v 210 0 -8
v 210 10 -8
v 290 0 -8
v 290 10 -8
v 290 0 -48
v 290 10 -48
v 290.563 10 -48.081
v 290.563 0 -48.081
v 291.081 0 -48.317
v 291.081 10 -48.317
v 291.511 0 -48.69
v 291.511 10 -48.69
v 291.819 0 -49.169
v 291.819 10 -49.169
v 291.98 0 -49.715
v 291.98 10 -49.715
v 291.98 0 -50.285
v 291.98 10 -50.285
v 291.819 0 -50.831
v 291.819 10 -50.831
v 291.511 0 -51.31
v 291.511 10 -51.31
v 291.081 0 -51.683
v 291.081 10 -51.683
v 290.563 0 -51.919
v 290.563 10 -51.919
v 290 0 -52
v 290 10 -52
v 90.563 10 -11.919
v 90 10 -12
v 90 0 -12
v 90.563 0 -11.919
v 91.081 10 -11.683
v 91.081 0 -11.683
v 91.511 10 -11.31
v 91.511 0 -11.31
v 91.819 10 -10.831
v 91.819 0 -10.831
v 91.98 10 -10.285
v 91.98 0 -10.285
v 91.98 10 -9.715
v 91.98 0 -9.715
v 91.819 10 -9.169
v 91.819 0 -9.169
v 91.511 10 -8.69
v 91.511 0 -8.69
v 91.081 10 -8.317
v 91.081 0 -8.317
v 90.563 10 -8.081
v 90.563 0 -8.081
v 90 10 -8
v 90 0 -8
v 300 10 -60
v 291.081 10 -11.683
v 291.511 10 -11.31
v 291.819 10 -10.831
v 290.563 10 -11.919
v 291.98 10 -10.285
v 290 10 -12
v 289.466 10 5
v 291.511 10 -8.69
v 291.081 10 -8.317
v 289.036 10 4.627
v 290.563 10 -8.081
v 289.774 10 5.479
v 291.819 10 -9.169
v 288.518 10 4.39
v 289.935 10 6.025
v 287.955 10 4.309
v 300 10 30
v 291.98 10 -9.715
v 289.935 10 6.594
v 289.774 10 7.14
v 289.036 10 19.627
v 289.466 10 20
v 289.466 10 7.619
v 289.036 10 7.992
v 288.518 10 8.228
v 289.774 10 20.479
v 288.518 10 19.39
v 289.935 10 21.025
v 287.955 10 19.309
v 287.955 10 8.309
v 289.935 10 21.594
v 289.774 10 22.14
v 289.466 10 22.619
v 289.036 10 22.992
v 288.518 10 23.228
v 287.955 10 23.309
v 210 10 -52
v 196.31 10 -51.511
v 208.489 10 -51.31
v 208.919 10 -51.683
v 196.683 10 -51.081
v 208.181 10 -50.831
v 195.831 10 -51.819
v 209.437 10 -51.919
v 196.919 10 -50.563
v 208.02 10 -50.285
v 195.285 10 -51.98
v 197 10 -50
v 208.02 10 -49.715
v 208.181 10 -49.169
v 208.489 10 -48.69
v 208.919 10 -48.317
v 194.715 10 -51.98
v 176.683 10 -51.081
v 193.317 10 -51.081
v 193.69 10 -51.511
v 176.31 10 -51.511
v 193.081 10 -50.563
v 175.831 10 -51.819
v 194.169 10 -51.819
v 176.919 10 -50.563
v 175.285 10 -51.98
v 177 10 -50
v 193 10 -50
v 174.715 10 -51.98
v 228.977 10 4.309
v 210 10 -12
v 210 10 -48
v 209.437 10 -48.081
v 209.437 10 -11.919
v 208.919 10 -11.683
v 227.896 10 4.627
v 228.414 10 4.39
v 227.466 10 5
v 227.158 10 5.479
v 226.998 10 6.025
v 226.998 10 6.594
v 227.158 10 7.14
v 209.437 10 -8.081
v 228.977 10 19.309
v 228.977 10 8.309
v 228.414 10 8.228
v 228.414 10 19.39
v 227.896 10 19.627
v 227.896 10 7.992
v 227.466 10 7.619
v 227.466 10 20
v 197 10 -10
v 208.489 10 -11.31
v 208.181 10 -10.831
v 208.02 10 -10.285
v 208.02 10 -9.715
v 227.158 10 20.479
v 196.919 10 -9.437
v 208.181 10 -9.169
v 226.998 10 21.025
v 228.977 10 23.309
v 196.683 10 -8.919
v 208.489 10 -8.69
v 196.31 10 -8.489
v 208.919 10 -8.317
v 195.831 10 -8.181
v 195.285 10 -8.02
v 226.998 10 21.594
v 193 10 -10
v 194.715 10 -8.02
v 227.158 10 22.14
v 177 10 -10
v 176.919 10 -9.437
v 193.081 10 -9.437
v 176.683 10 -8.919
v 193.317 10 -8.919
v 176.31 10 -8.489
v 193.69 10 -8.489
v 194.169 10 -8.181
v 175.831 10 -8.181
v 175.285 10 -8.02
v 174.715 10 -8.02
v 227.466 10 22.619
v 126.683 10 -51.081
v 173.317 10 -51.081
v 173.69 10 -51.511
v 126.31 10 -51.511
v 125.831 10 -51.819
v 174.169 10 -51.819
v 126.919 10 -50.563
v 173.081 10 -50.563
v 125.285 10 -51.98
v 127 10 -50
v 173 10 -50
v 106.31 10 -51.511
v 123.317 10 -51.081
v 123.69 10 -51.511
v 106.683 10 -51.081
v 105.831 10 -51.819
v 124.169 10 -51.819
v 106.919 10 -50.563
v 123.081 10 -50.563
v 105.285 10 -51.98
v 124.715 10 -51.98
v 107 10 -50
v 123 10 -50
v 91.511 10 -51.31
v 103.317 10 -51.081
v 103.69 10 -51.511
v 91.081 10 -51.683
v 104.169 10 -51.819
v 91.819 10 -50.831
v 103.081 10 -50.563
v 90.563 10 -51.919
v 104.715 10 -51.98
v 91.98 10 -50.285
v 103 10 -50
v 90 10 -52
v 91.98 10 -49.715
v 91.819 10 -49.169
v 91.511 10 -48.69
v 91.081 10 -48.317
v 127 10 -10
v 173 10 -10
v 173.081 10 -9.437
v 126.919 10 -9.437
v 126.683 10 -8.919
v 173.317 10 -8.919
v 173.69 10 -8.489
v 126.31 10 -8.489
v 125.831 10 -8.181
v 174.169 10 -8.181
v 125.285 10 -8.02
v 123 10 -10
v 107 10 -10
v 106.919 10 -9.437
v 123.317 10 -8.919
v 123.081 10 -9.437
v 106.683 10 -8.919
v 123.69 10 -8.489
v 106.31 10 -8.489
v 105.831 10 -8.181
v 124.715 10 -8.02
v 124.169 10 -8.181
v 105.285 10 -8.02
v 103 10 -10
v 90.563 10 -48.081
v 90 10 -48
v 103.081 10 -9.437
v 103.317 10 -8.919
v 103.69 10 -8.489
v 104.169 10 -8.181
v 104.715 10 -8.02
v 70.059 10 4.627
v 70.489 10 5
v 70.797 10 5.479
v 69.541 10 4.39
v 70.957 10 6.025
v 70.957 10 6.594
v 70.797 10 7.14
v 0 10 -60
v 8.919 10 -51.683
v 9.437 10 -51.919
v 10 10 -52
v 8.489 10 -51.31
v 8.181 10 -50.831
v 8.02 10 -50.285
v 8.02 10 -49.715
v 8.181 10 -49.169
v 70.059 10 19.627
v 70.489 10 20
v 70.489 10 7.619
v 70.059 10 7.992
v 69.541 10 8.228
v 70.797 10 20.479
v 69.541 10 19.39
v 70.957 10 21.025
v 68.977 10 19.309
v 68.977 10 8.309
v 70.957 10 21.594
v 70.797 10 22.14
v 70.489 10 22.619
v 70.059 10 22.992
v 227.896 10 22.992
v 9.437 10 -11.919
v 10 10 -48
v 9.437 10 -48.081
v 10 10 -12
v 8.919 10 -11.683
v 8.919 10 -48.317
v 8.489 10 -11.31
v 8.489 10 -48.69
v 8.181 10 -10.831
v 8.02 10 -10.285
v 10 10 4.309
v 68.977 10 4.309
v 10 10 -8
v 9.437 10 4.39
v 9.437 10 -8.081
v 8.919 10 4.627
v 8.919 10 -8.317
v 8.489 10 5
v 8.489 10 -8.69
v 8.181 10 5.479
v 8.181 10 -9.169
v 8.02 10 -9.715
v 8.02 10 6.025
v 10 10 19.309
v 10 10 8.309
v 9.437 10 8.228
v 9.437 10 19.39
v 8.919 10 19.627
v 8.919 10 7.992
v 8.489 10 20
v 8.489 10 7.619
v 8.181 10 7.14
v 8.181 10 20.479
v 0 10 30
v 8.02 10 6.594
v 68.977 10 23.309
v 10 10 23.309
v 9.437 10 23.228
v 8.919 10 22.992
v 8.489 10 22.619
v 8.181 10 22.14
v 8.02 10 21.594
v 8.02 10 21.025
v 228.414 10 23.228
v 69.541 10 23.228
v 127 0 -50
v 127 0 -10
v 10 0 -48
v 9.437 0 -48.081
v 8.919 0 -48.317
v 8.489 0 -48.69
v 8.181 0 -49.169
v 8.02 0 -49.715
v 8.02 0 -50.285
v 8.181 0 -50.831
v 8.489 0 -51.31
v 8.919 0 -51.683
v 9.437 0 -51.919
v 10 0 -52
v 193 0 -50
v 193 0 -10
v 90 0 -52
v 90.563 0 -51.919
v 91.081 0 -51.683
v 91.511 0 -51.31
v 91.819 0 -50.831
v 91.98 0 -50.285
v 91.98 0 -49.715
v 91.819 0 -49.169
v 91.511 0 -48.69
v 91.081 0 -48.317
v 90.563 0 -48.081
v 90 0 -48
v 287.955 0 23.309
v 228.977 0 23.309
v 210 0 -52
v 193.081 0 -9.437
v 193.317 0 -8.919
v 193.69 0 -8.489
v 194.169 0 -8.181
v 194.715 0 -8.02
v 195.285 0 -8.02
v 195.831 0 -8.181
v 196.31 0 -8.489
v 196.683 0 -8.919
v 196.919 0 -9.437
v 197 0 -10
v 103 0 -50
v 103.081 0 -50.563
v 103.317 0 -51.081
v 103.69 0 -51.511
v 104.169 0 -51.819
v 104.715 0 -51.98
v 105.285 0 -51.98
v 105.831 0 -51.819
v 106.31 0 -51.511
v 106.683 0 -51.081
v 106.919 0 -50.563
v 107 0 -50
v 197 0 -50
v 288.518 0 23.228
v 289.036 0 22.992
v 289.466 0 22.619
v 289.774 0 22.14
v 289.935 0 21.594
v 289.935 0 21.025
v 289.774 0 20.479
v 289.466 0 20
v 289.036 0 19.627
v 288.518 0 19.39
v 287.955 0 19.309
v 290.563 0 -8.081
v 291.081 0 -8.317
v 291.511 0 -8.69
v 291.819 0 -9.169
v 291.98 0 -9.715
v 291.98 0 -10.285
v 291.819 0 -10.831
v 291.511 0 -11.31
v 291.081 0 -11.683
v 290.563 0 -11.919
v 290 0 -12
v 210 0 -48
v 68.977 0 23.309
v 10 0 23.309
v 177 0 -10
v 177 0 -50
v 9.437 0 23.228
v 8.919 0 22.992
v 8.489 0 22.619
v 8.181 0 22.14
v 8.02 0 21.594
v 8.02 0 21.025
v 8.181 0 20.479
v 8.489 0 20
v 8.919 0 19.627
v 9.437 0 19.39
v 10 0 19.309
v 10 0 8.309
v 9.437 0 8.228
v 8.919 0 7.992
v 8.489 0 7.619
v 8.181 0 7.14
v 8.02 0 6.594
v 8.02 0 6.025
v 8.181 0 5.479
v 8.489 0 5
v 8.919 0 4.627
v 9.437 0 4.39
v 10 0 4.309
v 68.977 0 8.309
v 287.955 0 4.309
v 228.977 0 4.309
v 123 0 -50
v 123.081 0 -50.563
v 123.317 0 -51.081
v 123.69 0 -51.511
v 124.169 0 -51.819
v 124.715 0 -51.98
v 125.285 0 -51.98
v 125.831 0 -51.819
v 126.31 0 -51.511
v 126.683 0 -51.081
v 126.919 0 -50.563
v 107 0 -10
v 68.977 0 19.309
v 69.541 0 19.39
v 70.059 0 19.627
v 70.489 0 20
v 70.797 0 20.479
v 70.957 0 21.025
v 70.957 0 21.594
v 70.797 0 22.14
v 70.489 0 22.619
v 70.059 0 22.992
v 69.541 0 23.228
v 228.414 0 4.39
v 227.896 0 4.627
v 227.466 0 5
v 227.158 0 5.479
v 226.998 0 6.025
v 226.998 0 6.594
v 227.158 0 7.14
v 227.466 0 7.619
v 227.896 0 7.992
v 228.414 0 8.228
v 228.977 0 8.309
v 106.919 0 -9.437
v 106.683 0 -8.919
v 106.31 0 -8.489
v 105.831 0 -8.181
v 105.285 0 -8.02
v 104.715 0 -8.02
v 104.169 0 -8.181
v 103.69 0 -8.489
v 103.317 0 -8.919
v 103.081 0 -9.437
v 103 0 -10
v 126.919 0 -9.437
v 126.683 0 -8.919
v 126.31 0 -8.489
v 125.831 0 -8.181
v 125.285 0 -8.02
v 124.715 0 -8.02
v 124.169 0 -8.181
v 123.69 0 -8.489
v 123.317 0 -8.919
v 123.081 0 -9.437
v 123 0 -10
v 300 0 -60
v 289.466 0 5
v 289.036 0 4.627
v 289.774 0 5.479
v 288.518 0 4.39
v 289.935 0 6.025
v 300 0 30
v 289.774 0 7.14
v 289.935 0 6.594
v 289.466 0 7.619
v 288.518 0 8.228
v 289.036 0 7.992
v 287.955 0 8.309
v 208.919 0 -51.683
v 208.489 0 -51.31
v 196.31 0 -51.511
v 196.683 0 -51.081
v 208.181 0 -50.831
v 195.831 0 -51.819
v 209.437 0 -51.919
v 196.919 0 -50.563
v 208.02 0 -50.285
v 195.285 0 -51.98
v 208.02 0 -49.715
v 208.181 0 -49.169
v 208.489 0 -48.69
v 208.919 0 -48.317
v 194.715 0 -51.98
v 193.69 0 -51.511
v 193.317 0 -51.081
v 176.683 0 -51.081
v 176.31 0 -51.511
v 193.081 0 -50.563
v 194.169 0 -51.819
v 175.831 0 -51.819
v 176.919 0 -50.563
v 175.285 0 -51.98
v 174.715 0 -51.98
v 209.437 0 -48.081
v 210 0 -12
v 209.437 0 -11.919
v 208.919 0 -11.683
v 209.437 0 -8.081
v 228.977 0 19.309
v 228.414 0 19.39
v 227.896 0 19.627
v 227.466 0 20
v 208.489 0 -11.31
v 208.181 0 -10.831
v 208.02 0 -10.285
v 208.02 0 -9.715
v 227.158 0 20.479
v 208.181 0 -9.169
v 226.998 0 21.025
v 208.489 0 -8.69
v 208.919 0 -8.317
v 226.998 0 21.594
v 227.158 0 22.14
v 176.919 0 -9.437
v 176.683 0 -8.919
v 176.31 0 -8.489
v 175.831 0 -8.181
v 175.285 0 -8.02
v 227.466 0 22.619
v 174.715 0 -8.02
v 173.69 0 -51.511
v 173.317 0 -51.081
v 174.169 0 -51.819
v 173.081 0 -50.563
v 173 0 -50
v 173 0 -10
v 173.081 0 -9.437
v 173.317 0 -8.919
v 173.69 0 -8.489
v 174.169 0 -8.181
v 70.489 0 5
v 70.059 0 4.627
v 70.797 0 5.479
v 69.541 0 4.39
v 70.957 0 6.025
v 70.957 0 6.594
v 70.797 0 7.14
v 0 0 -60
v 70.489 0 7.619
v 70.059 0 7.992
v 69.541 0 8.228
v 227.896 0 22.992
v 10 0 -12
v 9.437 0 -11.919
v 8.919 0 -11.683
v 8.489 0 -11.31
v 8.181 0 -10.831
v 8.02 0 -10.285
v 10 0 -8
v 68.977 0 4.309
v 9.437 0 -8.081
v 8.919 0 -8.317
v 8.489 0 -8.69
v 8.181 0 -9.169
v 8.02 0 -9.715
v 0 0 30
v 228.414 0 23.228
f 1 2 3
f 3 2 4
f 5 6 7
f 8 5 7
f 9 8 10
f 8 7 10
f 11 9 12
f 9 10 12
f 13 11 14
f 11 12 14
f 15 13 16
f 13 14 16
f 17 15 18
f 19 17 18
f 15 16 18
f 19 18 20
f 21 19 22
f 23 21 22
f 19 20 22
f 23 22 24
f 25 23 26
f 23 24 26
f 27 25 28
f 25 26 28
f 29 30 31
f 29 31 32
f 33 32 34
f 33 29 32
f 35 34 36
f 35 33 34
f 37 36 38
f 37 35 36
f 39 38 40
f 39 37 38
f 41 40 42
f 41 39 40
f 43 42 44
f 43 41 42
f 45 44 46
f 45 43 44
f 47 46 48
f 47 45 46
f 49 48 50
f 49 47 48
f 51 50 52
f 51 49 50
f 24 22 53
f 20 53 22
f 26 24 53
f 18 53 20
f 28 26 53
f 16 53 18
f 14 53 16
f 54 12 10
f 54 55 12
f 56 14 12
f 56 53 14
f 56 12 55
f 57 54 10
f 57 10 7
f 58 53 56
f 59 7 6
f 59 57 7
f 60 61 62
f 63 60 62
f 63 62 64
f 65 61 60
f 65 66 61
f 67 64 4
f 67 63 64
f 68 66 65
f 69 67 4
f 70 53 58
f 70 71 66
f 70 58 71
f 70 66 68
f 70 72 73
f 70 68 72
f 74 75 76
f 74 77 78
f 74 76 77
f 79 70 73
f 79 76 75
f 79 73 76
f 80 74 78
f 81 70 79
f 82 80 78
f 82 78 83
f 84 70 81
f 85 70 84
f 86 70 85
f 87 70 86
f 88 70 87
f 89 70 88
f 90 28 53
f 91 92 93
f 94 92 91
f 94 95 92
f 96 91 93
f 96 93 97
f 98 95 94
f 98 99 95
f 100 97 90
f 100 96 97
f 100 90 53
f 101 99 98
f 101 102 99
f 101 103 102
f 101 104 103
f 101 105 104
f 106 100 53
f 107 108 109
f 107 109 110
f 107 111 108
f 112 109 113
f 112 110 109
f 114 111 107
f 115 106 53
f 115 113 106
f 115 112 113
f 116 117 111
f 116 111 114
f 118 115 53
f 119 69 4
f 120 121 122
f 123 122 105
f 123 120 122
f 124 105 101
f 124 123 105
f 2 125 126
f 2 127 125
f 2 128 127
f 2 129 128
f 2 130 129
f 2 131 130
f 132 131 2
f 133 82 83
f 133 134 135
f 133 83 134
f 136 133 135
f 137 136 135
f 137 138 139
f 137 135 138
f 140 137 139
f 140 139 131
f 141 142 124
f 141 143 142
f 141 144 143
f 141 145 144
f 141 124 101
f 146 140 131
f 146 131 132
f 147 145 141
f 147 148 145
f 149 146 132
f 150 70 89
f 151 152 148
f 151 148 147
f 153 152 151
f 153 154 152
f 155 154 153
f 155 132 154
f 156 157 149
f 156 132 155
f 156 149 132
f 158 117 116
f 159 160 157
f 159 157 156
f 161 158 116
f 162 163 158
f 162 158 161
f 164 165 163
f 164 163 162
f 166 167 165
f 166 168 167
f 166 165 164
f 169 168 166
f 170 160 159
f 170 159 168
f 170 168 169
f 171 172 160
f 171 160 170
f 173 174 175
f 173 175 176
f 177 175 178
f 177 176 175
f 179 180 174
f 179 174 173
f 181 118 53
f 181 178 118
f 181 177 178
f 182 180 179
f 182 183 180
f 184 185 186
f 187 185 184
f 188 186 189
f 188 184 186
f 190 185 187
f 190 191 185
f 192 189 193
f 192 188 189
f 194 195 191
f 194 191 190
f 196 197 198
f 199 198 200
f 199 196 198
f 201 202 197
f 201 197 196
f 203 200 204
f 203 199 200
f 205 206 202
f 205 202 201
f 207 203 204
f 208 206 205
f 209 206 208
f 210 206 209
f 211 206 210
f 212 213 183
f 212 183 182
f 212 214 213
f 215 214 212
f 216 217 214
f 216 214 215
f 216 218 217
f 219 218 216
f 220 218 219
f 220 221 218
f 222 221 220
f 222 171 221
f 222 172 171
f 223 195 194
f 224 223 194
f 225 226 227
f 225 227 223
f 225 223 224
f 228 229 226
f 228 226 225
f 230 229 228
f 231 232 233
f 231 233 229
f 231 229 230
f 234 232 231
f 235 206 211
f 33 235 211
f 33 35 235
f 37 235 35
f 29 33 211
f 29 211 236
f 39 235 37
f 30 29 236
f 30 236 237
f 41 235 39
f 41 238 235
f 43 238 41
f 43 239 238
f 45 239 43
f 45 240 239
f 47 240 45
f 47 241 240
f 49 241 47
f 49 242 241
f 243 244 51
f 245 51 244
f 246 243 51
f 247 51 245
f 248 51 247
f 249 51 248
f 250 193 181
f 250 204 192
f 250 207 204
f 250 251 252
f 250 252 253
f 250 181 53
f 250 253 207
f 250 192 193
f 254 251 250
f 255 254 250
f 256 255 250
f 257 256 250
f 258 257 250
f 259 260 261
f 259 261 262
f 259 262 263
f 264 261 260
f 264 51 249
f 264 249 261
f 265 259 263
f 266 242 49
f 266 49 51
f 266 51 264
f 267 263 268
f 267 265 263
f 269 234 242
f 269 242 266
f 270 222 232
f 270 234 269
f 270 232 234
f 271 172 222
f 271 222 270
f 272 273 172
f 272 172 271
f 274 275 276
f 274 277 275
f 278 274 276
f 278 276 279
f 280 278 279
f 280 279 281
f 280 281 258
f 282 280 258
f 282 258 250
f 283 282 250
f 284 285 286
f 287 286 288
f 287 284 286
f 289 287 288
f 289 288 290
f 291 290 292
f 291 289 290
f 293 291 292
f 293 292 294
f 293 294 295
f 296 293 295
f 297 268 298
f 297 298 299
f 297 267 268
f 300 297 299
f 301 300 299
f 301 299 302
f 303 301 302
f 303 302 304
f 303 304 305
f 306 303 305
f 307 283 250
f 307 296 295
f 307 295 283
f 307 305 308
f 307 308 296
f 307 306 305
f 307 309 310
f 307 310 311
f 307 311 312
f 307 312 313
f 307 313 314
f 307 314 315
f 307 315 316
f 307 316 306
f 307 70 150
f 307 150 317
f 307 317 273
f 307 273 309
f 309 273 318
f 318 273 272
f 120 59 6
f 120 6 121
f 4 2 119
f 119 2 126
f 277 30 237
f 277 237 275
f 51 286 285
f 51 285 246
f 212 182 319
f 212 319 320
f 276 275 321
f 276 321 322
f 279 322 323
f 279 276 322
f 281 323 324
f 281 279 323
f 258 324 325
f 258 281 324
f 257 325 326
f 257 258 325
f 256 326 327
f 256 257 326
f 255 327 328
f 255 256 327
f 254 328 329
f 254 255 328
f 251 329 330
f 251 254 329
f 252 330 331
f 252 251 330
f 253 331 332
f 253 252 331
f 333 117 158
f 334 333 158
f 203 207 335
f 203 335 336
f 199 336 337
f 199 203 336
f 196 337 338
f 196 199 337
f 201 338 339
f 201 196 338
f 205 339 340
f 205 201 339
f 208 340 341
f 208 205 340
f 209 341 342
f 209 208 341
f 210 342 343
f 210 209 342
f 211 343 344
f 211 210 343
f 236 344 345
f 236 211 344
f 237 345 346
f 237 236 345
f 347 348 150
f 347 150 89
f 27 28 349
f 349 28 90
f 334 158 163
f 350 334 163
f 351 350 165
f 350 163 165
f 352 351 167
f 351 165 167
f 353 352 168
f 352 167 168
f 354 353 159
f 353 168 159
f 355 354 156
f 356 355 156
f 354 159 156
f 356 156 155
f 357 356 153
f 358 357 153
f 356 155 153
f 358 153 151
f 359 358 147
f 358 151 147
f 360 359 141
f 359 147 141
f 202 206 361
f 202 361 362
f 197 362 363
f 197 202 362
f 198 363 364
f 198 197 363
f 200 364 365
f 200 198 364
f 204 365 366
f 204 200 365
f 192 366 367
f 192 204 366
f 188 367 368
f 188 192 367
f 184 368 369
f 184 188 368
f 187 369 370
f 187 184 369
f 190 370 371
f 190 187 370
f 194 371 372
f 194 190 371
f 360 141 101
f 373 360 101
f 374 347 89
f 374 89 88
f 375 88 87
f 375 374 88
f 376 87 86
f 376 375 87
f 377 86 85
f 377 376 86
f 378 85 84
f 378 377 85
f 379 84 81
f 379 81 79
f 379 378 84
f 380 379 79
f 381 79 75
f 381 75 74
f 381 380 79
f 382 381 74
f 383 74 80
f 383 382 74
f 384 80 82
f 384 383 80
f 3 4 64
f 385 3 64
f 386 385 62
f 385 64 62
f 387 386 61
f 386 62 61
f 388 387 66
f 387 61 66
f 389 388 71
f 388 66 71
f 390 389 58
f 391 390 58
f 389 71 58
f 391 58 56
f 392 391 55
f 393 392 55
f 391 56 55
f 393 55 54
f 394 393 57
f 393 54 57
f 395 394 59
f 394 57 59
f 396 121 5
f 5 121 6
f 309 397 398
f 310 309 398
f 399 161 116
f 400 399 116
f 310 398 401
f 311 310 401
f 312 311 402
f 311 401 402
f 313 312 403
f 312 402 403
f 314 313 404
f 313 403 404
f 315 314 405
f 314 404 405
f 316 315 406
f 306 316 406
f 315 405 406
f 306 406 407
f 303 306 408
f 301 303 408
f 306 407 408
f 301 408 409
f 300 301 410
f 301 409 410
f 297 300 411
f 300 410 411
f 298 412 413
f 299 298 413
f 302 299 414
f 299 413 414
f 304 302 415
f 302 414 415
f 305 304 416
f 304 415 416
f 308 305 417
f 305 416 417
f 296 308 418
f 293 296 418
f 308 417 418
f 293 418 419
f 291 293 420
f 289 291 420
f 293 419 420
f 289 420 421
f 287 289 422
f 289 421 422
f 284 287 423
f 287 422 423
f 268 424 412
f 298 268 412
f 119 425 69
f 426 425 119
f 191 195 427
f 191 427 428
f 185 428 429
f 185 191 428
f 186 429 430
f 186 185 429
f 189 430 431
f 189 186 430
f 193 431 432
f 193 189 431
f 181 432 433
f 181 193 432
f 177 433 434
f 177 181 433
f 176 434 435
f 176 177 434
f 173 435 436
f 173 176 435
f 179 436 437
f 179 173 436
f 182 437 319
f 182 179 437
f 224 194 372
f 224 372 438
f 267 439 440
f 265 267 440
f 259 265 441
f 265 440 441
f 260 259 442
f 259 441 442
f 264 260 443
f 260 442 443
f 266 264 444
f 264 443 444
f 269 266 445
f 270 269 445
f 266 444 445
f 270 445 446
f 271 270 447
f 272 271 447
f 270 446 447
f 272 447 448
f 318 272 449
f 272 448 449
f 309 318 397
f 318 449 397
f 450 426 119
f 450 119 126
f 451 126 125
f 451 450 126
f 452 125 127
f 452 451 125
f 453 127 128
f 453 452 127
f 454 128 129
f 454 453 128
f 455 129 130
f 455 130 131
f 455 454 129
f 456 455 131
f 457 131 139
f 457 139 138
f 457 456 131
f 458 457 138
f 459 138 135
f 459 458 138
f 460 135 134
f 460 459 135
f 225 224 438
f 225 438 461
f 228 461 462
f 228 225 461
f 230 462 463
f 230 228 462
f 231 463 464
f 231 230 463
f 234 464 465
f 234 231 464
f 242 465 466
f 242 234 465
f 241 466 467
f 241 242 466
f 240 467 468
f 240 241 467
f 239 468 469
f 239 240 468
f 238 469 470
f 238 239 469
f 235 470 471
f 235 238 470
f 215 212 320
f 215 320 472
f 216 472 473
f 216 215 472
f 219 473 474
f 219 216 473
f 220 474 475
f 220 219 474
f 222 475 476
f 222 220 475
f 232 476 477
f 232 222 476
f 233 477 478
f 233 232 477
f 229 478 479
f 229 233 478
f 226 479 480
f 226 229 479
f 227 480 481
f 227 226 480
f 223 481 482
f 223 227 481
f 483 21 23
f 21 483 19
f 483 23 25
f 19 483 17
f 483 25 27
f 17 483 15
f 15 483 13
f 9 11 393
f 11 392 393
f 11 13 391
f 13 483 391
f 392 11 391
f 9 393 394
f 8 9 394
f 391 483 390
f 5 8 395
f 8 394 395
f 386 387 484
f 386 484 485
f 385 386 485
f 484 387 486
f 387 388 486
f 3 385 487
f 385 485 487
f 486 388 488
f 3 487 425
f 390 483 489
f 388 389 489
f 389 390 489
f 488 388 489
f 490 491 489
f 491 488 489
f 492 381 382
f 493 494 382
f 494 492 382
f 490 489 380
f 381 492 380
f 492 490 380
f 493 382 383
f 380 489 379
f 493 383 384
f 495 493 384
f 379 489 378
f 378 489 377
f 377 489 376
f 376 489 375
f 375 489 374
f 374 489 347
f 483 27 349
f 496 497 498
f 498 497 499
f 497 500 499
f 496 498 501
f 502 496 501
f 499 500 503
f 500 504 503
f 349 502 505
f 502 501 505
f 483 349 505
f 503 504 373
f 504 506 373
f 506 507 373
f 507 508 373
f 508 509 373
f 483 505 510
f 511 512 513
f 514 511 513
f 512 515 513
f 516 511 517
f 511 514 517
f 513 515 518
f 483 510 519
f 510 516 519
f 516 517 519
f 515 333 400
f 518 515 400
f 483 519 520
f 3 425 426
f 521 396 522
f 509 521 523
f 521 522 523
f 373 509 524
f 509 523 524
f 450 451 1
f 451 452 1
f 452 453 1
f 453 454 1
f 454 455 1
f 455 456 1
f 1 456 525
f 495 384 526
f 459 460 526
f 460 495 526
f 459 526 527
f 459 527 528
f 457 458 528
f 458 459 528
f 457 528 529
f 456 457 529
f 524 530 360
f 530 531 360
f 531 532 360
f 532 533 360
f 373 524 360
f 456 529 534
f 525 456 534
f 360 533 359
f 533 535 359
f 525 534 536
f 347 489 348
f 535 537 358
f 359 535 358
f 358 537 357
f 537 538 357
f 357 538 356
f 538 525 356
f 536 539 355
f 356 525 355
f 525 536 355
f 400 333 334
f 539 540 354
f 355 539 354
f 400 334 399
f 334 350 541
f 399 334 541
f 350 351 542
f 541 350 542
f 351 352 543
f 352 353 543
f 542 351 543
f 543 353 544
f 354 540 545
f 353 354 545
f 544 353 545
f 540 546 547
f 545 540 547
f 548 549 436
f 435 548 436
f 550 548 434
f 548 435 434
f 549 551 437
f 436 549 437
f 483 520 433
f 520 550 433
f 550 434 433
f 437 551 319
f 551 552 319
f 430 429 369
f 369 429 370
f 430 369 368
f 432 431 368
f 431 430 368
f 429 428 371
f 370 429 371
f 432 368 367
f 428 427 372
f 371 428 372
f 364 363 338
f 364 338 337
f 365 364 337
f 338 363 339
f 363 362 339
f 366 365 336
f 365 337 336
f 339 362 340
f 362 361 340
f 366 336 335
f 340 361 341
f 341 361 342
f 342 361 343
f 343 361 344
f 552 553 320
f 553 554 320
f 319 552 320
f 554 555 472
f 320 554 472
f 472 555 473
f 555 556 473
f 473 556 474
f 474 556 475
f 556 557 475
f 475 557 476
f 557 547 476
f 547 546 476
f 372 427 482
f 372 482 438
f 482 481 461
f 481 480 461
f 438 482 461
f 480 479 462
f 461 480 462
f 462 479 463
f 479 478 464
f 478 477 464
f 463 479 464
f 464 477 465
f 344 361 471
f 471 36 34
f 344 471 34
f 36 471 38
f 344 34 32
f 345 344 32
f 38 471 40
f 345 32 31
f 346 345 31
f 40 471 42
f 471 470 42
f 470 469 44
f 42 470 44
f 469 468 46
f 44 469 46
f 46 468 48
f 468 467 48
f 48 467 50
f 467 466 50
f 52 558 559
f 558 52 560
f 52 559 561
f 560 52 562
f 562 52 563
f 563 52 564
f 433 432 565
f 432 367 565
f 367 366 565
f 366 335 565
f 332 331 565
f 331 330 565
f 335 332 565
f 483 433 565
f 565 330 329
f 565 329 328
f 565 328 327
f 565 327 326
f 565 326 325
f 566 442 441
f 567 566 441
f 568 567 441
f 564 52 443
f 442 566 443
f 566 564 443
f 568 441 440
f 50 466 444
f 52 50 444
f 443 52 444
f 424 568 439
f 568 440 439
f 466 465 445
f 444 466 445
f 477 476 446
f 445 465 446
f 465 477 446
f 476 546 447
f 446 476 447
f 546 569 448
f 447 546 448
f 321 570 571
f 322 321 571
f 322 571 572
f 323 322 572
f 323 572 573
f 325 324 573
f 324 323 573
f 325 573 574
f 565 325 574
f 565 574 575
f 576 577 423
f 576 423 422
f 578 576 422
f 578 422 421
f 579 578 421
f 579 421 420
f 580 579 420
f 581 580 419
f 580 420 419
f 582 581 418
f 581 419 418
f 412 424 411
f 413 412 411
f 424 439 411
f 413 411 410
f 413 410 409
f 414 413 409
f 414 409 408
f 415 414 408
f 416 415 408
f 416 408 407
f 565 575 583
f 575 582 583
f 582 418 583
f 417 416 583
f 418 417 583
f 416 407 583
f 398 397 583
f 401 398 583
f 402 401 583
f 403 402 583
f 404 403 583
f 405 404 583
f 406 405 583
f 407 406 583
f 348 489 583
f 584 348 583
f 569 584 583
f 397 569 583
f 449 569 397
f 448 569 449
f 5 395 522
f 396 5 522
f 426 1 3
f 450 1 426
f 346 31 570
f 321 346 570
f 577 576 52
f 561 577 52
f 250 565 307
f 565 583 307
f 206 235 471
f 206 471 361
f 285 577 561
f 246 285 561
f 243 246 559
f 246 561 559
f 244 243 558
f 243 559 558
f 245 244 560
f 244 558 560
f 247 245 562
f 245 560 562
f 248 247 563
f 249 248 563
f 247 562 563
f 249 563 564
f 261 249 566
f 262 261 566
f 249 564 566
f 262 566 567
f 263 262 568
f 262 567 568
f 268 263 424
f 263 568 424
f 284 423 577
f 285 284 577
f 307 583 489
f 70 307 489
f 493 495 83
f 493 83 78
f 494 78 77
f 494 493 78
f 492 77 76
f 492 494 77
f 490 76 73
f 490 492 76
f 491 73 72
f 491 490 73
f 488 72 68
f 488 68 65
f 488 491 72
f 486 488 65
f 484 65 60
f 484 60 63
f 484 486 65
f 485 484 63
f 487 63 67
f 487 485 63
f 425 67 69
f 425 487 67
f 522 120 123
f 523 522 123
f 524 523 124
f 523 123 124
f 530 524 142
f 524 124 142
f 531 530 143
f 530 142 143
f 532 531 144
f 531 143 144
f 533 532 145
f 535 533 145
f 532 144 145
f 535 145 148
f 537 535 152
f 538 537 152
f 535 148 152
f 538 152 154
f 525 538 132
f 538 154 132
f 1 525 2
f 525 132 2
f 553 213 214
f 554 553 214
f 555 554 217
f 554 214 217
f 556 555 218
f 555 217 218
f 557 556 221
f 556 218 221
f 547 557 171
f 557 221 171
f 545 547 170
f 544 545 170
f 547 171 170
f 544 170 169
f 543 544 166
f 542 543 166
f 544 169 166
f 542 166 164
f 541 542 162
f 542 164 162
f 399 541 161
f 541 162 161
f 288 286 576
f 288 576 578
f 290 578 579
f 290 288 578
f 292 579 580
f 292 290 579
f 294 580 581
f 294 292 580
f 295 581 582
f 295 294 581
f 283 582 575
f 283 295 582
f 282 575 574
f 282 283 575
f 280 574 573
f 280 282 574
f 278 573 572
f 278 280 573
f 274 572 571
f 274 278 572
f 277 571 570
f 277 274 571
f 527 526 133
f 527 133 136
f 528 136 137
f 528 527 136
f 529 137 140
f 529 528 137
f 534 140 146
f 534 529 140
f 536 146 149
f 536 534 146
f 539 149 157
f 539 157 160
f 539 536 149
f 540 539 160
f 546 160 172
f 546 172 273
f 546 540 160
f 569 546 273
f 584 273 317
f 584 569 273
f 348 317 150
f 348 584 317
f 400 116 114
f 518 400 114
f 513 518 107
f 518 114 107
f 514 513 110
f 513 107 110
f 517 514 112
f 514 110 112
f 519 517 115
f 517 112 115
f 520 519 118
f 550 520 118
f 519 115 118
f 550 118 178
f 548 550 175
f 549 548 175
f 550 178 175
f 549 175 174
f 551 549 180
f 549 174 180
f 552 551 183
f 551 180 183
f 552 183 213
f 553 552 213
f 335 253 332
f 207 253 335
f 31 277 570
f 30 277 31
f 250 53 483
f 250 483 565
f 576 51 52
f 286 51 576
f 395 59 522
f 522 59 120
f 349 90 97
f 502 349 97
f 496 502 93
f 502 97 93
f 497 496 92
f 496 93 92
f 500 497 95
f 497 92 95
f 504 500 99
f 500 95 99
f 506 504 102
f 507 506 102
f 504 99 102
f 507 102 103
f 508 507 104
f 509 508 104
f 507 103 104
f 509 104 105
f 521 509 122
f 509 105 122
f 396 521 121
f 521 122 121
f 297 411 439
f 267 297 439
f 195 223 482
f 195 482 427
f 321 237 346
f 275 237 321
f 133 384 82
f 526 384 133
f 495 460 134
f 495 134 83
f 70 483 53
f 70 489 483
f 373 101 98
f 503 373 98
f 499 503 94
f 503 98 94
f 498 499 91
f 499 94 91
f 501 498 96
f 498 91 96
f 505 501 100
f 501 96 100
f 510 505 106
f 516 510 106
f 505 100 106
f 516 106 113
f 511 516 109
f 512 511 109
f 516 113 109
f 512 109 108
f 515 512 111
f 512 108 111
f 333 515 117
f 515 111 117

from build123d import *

# Parameters (mm, degrees)
SKETCH1_W           = 300
SKETCH1_H           = 30
BOSS_EXTRUDE1_DEPTH = 10
SKETCH2_W           = 300
SKETCH2_H           = 10
BOSS_EXTRUDE2_DEPTH = 60
CUT_EXTRUDE1_DEPTH  = 307.1045573


with BuildPart() as part:
    # Sketch1 → Boss-Extrude1 (new body)
    with BuildSketch(Plane(origin=(0, 0, 0), x_dir=(1, 0, 0), z_dir=(0, 1, 0))):
        with Locations((150, -15)):
            Rectangle(SKETCH1_W, SKETCH1_H)
        with BuildLine():
            Line((68.977444605, -8.309450677), (10, -8.309450677))
            ThreePointArc((10, -8.309450677), (8, -6.309450677), (10, -4.309450677))
            Line((10, -4.309450677), (68.977444605, -4.309450677))
            ThreePointArc((68.977444605, -4.309450677), (70.977444605, -6.309450677), (68.977444605, -8.309450677))
        make_face(mode=Mode.SUBTRACT)
        with BuildLine():
            Line((68.977444605, -23.309450677), (10, -23.309450677))
            ThreePointArc((10, -23.309450677), (8, -21.309450677), (10, -19.309450677))
            Line((10, -19.309450677), (68.977444605, -19.309450677))
            ThreePointArc((68.977444605, -19.309450677), (70.977444605, -21.309450677), (68.977444605, -23.309450677))
        make_face(mode=Mode.SUBTRACT)
        with BuildLine():
            Line((228.977444605, -23.309450677), (287.95488921, -23.309450677))
            ThreePointArc((287.95488921, -23.309450677), (289.95488921, -21.309450677), (287.95488921, -19.309450677))
            Line((287.95488921, -19.309450677), (228.977444605, -19.309450677))
            ThreePointArc((228.977444605, -19.309450677), (226.977444605, -21.309450677), (228.977444605, -23.309450677))
        make_face(mode=Mode.SUBTRACT)
        with BuildLine():
            Line((228.977444605, -8.309450677), (287.95488921, -8.309450677))
            ThreePointArc((287.95488921, -8.309450677), (289.95488921, -6.309450677), (287.95488921, -4.309450677))
            Line((287.95488921, -4.309450677), (228.977444605, -4.309450677))
            ThreePointArc((228.977444605, -4.309450677), (226.977444605, -6.309450677), (228.977444605, -8.309450677))
        make_face(mode=Mode.SUBTRACT)
    extrude(amount=BOSS_EXTRUDE1_DEPTH)

    # Sketch2 → Boss-Extrude2 (add)
    with BuildSketch(Plane(origin=(0, 0, 0), x_dir=(-1, 0, 0), z_dir=(0, 0, -1))):
        with Locations((-150, 5)):
            Rectangle(SKETCH2_W, SKETCH2_H)
    extrude(amount=BOSS_EXTRUDE2_DEPTH)

    # Sketch3 → Cut-Extrude1 (cut, through all)
    with BuildSketch(Plane(origin=(0, 10, 0), x_dir=(1, 0, 0), z_dir=(0, 1, 0))):
        with BuildLine():
            Line((10, 52), (90, 52))
            ThreePointArc((90, 52), (92, 50), (90, 48))
            Line((90, 48), (10, 48))
            ThreePointArc((10, 48), (8, 50), (10, 52))
        make_face()
        with BuildLine():
            Line((10, 12), (90, 12))
            ThreePointArc((90, 12), (92, 10), (90, 8))
            Line((90, 8), (10, 8))
            ThreePointArc((10, 8), (8, 10), (10, 12))
        make_face()
        with BuildLine():
            Line((127, 50), (127, 10))
            ThreePointArc((127, 10), (125, 8), (123, 10))
            Line((123, 10), (123, 50))
            ThreePointArc((123, 50), (125, 52), (127, 50))
        make_face()
        with BuildLine():
            Line((107, 50), (107, 10))
            ThreePointArc((107, 10), (105, 8), (103, 10))
            Line((103, 10), (103, 50))
            ThreePointArc((103, 50), (105, 52), (107, 50))
        make_face()
        with BuildLine():
            Line((290, 52), (210, 52))
            ThreePointArc((210, 52), (208, 50), (210, 48))
            Line((210, 48), (290, 48))
            ThreePointArc((290, 48), (292, 50), (290, 52))
        make_face()
        with BuildLine():
            Line((290, 12), (210, 12))
            ThreePointArc((210, 12), (208, 10), (210, 8))
            Line((210, 8), (290, 8))
            ThreePointArc((290, 8), (292, 10), (290, 12))
        make_face()
        with BuildLine():
            Line((173, 50), (173, 10))
            ThreePointArc((173, 10), (175, 8), (177, 10))
            Line((177, 10), (177, 50))
            ThreePointArc((177, 50), (175, 52), (173, 50))
        make_face()
        with BuildLine():
            Line((193, 50), (193, 10))
            ThreePointArc((193, 10), (195, 8), (197, 10))
            Line((197, 10), (197, 50))
            ThreePointArc((197, 50), (195, 52), (193, 50))
        make_face()
    extrude(amount=-CUT_EXTRUDE1_DEPTH, mode=Mode.SUBTRACT)


solid = part.part
